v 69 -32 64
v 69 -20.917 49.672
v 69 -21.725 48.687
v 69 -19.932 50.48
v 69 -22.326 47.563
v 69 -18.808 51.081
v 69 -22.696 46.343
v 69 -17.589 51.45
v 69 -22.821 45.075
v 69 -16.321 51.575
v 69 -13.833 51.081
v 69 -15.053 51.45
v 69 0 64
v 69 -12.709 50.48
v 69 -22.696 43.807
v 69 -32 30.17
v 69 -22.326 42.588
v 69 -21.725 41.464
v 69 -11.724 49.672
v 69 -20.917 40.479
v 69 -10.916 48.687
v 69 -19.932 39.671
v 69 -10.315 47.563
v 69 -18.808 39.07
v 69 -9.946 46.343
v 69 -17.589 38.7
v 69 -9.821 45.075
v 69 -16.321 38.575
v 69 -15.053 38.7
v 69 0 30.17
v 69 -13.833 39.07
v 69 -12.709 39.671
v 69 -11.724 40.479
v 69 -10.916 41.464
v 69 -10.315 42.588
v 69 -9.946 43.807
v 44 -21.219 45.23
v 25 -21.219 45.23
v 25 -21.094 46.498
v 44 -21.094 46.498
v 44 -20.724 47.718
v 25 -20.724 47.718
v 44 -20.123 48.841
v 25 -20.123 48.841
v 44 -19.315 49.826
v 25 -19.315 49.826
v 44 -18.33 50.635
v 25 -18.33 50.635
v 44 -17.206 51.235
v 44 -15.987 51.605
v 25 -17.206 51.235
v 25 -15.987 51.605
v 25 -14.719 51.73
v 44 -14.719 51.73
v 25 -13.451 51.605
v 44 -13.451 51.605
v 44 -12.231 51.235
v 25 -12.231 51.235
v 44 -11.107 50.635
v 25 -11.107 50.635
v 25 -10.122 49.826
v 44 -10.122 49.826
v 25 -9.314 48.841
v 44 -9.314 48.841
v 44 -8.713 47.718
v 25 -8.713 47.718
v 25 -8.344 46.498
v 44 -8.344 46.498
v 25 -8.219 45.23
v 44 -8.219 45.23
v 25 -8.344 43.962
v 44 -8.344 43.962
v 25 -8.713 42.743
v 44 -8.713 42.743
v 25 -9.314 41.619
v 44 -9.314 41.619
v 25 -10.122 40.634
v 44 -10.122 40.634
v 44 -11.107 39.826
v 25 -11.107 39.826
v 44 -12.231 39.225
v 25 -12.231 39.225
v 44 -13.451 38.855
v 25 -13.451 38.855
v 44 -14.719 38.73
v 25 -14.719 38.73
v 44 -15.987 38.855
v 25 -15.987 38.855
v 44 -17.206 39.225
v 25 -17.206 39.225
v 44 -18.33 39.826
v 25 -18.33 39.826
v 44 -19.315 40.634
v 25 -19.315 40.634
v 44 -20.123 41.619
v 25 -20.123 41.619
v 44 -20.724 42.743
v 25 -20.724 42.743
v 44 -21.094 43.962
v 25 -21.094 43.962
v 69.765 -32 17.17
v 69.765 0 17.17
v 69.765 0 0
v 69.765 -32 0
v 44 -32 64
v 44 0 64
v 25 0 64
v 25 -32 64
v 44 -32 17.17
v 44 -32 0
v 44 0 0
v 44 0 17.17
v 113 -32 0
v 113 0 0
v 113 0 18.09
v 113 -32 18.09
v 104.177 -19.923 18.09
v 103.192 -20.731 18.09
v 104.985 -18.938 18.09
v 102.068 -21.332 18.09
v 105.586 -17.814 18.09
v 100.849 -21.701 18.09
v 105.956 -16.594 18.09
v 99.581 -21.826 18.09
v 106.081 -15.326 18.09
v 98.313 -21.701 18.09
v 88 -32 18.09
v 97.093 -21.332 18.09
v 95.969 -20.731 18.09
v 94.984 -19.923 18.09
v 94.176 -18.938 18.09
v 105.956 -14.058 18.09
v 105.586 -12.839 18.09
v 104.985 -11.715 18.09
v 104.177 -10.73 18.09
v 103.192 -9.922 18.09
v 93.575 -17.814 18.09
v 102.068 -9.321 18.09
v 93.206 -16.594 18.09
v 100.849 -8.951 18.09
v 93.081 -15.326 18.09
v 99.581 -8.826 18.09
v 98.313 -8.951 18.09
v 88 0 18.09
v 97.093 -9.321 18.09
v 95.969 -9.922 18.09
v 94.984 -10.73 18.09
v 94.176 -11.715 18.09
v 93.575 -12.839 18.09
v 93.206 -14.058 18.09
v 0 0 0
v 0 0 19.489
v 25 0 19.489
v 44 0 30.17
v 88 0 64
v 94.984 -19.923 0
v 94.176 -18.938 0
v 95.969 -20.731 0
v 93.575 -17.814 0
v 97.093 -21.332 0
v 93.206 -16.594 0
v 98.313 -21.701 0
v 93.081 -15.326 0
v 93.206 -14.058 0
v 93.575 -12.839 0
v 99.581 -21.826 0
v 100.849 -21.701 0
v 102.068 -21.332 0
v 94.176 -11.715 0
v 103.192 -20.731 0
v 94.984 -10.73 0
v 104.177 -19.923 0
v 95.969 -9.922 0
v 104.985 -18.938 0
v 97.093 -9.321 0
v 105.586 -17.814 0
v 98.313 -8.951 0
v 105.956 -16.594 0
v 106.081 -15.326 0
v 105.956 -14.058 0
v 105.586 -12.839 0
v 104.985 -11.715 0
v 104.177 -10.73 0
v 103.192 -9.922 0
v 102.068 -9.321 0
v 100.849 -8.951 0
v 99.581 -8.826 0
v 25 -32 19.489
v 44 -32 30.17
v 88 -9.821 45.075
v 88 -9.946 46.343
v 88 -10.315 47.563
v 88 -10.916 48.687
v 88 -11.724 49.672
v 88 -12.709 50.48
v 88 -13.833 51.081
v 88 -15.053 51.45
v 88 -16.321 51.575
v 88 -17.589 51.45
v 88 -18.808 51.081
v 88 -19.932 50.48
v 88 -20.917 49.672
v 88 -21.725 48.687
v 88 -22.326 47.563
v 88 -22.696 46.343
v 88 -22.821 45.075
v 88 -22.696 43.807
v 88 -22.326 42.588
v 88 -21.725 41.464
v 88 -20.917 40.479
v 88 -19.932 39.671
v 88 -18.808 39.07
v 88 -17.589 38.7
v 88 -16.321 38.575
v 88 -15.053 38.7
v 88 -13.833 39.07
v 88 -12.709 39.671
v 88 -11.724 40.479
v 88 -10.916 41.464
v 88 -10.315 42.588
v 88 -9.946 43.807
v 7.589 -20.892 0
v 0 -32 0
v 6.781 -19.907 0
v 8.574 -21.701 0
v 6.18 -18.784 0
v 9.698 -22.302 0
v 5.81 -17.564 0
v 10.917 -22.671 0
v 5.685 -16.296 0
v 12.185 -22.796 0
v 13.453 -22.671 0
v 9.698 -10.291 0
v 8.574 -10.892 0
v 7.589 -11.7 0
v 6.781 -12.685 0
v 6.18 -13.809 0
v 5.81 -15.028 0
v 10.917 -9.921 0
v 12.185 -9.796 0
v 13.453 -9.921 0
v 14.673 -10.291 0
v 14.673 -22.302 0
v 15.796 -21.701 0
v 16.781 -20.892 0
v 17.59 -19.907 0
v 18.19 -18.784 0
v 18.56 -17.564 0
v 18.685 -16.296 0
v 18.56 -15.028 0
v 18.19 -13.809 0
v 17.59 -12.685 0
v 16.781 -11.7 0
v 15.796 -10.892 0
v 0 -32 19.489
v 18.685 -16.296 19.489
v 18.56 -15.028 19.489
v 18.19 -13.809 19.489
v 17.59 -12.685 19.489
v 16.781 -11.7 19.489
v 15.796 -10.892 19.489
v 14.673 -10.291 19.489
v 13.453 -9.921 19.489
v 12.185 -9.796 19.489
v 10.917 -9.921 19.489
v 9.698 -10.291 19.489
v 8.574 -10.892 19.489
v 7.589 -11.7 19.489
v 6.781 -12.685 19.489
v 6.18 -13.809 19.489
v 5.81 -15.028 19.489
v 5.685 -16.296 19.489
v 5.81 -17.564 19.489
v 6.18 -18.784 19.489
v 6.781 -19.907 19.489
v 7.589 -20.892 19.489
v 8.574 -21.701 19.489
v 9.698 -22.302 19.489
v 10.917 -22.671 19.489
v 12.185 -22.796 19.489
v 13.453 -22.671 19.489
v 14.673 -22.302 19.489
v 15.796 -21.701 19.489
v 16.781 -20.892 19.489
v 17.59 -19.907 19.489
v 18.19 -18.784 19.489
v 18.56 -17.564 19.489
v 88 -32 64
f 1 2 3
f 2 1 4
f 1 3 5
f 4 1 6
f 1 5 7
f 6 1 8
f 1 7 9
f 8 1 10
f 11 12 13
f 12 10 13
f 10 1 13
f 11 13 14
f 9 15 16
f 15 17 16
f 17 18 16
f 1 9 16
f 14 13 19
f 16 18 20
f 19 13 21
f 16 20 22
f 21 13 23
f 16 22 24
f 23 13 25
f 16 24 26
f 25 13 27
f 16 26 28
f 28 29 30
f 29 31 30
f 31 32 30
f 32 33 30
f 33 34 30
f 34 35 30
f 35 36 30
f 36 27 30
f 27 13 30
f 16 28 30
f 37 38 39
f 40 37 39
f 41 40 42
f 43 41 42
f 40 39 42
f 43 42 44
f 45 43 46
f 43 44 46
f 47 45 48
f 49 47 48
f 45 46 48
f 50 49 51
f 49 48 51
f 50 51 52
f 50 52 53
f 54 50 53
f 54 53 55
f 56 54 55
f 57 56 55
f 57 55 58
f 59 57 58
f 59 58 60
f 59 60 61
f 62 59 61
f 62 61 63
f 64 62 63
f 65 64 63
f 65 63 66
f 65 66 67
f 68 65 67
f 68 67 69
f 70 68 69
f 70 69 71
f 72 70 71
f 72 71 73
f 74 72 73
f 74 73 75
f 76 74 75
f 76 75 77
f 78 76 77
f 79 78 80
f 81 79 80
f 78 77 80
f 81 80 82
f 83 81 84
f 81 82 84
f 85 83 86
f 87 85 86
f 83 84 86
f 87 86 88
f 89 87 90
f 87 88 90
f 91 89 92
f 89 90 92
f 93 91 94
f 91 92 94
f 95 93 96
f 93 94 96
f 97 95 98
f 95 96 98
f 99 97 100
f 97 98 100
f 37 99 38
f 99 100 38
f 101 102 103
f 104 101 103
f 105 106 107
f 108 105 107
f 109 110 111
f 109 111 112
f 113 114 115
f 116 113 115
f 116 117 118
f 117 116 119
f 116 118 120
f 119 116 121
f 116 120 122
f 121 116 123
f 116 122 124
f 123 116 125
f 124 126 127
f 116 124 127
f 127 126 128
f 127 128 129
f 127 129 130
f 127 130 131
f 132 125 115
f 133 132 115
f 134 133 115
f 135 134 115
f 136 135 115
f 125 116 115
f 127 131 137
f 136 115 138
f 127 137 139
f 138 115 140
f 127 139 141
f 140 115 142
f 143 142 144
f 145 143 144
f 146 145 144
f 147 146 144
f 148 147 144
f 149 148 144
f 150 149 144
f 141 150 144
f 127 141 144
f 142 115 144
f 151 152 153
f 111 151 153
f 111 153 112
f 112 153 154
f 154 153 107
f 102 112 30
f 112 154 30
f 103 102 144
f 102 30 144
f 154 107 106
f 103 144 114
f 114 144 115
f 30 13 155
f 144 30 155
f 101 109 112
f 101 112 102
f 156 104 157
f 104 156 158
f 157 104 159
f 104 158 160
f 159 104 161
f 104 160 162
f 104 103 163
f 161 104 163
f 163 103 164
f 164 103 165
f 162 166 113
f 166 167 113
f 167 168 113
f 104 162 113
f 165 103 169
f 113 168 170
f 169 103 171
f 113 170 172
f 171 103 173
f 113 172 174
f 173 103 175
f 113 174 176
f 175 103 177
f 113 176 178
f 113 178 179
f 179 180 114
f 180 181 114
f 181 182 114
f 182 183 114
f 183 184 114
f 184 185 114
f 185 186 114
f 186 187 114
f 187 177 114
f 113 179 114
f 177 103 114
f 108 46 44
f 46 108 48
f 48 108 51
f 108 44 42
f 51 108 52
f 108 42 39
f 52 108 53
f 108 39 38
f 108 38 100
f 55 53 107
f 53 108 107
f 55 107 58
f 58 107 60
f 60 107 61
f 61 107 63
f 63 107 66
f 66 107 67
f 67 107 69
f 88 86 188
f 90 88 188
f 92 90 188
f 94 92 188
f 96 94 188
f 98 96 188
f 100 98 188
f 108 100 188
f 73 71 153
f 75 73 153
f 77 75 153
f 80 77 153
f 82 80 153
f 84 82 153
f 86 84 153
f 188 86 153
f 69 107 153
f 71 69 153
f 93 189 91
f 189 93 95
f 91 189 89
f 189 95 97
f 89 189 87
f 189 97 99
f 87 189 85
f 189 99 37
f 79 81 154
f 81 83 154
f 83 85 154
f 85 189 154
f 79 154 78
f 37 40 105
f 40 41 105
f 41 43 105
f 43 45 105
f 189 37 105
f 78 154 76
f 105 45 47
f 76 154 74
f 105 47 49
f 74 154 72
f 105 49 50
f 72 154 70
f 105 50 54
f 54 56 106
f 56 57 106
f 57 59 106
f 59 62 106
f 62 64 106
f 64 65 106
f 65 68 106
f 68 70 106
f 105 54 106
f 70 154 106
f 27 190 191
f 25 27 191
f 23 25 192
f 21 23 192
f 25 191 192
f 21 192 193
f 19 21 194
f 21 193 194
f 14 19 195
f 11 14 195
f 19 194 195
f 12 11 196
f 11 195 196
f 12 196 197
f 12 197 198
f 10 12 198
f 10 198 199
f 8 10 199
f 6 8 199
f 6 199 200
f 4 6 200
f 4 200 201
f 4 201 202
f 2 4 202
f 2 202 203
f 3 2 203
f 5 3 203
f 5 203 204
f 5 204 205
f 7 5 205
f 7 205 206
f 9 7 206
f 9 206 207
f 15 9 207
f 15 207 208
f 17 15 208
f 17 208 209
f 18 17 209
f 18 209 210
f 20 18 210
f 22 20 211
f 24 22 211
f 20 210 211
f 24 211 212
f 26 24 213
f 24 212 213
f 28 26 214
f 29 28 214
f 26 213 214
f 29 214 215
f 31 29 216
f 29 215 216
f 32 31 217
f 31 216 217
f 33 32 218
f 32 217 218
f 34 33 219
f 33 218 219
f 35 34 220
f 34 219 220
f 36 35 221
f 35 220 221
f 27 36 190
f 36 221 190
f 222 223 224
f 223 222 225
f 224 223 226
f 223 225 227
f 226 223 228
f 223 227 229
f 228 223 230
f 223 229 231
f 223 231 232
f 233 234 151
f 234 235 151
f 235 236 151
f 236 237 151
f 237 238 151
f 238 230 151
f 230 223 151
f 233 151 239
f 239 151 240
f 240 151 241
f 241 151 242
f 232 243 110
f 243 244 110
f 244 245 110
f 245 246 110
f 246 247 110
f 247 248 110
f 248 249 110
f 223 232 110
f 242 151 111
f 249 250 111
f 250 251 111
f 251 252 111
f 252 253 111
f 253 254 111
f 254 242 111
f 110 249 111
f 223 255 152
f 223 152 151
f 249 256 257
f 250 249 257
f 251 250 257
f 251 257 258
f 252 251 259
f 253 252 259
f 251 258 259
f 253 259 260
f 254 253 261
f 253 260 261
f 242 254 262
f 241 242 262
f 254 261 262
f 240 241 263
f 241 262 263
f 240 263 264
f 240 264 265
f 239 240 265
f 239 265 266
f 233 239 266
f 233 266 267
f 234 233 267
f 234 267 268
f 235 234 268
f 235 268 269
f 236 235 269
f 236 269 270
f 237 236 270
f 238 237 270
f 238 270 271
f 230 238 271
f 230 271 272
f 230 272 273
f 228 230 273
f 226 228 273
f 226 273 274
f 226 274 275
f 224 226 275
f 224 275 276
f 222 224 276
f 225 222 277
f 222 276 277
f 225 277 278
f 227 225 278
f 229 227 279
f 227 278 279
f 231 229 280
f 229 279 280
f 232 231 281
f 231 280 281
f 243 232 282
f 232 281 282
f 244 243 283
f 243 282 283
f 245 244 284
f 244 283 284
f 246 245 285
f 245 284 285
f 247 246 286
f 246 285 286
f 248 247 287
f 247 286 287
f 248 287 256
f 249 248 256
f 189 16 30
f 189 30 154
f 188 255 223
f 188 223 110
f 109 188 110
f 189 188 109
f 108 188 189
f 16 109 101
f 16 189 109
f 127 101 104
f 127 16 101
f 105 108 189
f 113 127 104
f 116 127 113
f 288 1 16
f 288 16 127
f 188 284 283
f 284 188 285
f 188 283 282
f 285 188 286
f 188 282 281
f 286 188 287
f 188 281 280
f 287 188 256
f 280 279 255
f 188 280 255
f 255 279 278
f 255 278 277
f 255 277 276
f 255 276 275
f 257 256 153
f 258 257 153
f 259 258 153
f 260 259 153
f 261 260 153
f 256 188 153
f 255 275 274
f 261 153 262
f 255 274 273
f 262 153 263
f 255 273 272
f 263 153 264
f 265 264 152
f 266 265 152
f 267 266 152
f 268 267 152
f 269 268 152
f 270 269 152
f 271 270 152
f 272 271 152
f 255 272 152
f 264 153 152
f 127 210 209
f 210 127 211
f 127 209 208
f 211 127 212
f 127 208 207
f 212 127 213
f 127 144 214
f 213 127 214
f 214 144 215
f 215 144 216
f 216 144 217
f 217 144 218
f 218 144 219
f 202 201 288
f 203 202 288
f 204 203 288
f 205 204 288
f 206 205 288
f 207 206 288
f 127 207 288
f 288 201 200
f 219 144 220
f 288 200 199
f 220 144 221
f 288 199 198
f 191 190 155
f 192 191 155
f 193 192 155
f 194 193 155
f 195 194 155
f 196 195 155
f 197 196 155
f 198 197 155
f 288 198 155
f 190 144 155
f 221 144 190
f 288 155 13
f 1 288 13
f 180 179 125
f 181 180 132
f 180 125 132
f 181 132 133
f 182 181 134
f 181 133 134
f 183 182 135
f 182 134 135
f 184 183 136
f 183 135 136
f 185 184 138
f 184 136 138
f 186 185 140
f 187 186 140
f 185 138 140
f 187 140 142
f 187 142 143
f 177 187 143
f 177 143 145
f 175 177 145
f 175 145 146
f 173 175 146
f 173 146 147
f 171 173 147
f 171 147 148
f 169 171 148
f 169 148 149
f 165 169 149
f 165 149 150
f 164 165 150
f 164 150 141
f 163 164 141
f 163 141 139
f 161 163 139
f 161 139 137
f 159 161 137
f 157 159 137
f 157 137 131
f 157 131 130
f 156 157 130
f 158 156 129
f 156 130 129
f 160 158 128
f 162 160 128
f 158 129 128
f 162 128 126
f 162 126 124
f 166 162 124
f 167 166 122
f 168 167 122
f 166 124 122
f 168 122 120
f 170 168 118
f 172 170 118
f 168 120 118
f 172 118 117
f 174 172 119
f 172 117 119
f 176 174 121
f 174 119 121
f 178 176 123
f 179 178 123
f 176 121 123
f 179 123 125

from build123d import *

# Parameters (mm, degrees)
F1_DEPTH = 32
F2_R     = 6.5
F3_DEPTH = 25
F4_R     = 6.5
F5_DEPTH = 25
F6_R     = 6.5
F7_DEPTH = 25
F8_R     = 6.5
F9_DEPTH = 25


with BuildPart() as f1:
    # F0 (on Front) → F1 (new body)
    with BuildSketch(Plane.XZ):
        Polygon((0, 19.488953), (0, 0), (44, 0), (44, 17.170059), (69.764607, 17.170059), (69.764607, 0), (113, 0), (113, 18.089544), (88, 18.089544), (88, 64), (69, 64), (69, 30.170059), (44, 30.170059), (44, 64), (25, 64), (25, 19.488953), align=None)
    extrude(amount=F1_DEPTH)

    # F2 (on face) → F3 (cut)
    with BuildSketch(Plane.XY.offset(18.089544)):
        with Locations((99.580623, -15.326335)):
            Circle(F2_R)
    extrude(amount=-F3_DEPTH, mode=Mode.SUBTRACT)

    # F4 (on face) → F5 (cut)
    with BuildSketch(Plane.XY.offset(19.488953)):
        with Locations((12.18513, -16.29629)):
            Circle(F4_R)
    extrude(amount=-F5_DEPTH, mode=Mode.SUBTRACT)

    # F6 (on face) → F7 (cut)
    with BuildSketch(Plane.YZ.offset(88)):
        with Locations((-16.320663, 45.075346)):
            Circle(F6_R)
    extrude(amount=-F7_DEPTH, mode=Mode.SUBTRACT)

    # F8 (on face) → F9 (cut)
    with BuildSketch(Plane(origin=(25, 0, 0), x_dir=(0, -1, 0), z_dir=(-1, 0, 0))):
        with Locations((14.718622, 45.230217)):
            Circle(F8_R)
    extrude(amount=-F9_DEPTH, mode=Mode.SUBTRACT)


solid = f1.part
